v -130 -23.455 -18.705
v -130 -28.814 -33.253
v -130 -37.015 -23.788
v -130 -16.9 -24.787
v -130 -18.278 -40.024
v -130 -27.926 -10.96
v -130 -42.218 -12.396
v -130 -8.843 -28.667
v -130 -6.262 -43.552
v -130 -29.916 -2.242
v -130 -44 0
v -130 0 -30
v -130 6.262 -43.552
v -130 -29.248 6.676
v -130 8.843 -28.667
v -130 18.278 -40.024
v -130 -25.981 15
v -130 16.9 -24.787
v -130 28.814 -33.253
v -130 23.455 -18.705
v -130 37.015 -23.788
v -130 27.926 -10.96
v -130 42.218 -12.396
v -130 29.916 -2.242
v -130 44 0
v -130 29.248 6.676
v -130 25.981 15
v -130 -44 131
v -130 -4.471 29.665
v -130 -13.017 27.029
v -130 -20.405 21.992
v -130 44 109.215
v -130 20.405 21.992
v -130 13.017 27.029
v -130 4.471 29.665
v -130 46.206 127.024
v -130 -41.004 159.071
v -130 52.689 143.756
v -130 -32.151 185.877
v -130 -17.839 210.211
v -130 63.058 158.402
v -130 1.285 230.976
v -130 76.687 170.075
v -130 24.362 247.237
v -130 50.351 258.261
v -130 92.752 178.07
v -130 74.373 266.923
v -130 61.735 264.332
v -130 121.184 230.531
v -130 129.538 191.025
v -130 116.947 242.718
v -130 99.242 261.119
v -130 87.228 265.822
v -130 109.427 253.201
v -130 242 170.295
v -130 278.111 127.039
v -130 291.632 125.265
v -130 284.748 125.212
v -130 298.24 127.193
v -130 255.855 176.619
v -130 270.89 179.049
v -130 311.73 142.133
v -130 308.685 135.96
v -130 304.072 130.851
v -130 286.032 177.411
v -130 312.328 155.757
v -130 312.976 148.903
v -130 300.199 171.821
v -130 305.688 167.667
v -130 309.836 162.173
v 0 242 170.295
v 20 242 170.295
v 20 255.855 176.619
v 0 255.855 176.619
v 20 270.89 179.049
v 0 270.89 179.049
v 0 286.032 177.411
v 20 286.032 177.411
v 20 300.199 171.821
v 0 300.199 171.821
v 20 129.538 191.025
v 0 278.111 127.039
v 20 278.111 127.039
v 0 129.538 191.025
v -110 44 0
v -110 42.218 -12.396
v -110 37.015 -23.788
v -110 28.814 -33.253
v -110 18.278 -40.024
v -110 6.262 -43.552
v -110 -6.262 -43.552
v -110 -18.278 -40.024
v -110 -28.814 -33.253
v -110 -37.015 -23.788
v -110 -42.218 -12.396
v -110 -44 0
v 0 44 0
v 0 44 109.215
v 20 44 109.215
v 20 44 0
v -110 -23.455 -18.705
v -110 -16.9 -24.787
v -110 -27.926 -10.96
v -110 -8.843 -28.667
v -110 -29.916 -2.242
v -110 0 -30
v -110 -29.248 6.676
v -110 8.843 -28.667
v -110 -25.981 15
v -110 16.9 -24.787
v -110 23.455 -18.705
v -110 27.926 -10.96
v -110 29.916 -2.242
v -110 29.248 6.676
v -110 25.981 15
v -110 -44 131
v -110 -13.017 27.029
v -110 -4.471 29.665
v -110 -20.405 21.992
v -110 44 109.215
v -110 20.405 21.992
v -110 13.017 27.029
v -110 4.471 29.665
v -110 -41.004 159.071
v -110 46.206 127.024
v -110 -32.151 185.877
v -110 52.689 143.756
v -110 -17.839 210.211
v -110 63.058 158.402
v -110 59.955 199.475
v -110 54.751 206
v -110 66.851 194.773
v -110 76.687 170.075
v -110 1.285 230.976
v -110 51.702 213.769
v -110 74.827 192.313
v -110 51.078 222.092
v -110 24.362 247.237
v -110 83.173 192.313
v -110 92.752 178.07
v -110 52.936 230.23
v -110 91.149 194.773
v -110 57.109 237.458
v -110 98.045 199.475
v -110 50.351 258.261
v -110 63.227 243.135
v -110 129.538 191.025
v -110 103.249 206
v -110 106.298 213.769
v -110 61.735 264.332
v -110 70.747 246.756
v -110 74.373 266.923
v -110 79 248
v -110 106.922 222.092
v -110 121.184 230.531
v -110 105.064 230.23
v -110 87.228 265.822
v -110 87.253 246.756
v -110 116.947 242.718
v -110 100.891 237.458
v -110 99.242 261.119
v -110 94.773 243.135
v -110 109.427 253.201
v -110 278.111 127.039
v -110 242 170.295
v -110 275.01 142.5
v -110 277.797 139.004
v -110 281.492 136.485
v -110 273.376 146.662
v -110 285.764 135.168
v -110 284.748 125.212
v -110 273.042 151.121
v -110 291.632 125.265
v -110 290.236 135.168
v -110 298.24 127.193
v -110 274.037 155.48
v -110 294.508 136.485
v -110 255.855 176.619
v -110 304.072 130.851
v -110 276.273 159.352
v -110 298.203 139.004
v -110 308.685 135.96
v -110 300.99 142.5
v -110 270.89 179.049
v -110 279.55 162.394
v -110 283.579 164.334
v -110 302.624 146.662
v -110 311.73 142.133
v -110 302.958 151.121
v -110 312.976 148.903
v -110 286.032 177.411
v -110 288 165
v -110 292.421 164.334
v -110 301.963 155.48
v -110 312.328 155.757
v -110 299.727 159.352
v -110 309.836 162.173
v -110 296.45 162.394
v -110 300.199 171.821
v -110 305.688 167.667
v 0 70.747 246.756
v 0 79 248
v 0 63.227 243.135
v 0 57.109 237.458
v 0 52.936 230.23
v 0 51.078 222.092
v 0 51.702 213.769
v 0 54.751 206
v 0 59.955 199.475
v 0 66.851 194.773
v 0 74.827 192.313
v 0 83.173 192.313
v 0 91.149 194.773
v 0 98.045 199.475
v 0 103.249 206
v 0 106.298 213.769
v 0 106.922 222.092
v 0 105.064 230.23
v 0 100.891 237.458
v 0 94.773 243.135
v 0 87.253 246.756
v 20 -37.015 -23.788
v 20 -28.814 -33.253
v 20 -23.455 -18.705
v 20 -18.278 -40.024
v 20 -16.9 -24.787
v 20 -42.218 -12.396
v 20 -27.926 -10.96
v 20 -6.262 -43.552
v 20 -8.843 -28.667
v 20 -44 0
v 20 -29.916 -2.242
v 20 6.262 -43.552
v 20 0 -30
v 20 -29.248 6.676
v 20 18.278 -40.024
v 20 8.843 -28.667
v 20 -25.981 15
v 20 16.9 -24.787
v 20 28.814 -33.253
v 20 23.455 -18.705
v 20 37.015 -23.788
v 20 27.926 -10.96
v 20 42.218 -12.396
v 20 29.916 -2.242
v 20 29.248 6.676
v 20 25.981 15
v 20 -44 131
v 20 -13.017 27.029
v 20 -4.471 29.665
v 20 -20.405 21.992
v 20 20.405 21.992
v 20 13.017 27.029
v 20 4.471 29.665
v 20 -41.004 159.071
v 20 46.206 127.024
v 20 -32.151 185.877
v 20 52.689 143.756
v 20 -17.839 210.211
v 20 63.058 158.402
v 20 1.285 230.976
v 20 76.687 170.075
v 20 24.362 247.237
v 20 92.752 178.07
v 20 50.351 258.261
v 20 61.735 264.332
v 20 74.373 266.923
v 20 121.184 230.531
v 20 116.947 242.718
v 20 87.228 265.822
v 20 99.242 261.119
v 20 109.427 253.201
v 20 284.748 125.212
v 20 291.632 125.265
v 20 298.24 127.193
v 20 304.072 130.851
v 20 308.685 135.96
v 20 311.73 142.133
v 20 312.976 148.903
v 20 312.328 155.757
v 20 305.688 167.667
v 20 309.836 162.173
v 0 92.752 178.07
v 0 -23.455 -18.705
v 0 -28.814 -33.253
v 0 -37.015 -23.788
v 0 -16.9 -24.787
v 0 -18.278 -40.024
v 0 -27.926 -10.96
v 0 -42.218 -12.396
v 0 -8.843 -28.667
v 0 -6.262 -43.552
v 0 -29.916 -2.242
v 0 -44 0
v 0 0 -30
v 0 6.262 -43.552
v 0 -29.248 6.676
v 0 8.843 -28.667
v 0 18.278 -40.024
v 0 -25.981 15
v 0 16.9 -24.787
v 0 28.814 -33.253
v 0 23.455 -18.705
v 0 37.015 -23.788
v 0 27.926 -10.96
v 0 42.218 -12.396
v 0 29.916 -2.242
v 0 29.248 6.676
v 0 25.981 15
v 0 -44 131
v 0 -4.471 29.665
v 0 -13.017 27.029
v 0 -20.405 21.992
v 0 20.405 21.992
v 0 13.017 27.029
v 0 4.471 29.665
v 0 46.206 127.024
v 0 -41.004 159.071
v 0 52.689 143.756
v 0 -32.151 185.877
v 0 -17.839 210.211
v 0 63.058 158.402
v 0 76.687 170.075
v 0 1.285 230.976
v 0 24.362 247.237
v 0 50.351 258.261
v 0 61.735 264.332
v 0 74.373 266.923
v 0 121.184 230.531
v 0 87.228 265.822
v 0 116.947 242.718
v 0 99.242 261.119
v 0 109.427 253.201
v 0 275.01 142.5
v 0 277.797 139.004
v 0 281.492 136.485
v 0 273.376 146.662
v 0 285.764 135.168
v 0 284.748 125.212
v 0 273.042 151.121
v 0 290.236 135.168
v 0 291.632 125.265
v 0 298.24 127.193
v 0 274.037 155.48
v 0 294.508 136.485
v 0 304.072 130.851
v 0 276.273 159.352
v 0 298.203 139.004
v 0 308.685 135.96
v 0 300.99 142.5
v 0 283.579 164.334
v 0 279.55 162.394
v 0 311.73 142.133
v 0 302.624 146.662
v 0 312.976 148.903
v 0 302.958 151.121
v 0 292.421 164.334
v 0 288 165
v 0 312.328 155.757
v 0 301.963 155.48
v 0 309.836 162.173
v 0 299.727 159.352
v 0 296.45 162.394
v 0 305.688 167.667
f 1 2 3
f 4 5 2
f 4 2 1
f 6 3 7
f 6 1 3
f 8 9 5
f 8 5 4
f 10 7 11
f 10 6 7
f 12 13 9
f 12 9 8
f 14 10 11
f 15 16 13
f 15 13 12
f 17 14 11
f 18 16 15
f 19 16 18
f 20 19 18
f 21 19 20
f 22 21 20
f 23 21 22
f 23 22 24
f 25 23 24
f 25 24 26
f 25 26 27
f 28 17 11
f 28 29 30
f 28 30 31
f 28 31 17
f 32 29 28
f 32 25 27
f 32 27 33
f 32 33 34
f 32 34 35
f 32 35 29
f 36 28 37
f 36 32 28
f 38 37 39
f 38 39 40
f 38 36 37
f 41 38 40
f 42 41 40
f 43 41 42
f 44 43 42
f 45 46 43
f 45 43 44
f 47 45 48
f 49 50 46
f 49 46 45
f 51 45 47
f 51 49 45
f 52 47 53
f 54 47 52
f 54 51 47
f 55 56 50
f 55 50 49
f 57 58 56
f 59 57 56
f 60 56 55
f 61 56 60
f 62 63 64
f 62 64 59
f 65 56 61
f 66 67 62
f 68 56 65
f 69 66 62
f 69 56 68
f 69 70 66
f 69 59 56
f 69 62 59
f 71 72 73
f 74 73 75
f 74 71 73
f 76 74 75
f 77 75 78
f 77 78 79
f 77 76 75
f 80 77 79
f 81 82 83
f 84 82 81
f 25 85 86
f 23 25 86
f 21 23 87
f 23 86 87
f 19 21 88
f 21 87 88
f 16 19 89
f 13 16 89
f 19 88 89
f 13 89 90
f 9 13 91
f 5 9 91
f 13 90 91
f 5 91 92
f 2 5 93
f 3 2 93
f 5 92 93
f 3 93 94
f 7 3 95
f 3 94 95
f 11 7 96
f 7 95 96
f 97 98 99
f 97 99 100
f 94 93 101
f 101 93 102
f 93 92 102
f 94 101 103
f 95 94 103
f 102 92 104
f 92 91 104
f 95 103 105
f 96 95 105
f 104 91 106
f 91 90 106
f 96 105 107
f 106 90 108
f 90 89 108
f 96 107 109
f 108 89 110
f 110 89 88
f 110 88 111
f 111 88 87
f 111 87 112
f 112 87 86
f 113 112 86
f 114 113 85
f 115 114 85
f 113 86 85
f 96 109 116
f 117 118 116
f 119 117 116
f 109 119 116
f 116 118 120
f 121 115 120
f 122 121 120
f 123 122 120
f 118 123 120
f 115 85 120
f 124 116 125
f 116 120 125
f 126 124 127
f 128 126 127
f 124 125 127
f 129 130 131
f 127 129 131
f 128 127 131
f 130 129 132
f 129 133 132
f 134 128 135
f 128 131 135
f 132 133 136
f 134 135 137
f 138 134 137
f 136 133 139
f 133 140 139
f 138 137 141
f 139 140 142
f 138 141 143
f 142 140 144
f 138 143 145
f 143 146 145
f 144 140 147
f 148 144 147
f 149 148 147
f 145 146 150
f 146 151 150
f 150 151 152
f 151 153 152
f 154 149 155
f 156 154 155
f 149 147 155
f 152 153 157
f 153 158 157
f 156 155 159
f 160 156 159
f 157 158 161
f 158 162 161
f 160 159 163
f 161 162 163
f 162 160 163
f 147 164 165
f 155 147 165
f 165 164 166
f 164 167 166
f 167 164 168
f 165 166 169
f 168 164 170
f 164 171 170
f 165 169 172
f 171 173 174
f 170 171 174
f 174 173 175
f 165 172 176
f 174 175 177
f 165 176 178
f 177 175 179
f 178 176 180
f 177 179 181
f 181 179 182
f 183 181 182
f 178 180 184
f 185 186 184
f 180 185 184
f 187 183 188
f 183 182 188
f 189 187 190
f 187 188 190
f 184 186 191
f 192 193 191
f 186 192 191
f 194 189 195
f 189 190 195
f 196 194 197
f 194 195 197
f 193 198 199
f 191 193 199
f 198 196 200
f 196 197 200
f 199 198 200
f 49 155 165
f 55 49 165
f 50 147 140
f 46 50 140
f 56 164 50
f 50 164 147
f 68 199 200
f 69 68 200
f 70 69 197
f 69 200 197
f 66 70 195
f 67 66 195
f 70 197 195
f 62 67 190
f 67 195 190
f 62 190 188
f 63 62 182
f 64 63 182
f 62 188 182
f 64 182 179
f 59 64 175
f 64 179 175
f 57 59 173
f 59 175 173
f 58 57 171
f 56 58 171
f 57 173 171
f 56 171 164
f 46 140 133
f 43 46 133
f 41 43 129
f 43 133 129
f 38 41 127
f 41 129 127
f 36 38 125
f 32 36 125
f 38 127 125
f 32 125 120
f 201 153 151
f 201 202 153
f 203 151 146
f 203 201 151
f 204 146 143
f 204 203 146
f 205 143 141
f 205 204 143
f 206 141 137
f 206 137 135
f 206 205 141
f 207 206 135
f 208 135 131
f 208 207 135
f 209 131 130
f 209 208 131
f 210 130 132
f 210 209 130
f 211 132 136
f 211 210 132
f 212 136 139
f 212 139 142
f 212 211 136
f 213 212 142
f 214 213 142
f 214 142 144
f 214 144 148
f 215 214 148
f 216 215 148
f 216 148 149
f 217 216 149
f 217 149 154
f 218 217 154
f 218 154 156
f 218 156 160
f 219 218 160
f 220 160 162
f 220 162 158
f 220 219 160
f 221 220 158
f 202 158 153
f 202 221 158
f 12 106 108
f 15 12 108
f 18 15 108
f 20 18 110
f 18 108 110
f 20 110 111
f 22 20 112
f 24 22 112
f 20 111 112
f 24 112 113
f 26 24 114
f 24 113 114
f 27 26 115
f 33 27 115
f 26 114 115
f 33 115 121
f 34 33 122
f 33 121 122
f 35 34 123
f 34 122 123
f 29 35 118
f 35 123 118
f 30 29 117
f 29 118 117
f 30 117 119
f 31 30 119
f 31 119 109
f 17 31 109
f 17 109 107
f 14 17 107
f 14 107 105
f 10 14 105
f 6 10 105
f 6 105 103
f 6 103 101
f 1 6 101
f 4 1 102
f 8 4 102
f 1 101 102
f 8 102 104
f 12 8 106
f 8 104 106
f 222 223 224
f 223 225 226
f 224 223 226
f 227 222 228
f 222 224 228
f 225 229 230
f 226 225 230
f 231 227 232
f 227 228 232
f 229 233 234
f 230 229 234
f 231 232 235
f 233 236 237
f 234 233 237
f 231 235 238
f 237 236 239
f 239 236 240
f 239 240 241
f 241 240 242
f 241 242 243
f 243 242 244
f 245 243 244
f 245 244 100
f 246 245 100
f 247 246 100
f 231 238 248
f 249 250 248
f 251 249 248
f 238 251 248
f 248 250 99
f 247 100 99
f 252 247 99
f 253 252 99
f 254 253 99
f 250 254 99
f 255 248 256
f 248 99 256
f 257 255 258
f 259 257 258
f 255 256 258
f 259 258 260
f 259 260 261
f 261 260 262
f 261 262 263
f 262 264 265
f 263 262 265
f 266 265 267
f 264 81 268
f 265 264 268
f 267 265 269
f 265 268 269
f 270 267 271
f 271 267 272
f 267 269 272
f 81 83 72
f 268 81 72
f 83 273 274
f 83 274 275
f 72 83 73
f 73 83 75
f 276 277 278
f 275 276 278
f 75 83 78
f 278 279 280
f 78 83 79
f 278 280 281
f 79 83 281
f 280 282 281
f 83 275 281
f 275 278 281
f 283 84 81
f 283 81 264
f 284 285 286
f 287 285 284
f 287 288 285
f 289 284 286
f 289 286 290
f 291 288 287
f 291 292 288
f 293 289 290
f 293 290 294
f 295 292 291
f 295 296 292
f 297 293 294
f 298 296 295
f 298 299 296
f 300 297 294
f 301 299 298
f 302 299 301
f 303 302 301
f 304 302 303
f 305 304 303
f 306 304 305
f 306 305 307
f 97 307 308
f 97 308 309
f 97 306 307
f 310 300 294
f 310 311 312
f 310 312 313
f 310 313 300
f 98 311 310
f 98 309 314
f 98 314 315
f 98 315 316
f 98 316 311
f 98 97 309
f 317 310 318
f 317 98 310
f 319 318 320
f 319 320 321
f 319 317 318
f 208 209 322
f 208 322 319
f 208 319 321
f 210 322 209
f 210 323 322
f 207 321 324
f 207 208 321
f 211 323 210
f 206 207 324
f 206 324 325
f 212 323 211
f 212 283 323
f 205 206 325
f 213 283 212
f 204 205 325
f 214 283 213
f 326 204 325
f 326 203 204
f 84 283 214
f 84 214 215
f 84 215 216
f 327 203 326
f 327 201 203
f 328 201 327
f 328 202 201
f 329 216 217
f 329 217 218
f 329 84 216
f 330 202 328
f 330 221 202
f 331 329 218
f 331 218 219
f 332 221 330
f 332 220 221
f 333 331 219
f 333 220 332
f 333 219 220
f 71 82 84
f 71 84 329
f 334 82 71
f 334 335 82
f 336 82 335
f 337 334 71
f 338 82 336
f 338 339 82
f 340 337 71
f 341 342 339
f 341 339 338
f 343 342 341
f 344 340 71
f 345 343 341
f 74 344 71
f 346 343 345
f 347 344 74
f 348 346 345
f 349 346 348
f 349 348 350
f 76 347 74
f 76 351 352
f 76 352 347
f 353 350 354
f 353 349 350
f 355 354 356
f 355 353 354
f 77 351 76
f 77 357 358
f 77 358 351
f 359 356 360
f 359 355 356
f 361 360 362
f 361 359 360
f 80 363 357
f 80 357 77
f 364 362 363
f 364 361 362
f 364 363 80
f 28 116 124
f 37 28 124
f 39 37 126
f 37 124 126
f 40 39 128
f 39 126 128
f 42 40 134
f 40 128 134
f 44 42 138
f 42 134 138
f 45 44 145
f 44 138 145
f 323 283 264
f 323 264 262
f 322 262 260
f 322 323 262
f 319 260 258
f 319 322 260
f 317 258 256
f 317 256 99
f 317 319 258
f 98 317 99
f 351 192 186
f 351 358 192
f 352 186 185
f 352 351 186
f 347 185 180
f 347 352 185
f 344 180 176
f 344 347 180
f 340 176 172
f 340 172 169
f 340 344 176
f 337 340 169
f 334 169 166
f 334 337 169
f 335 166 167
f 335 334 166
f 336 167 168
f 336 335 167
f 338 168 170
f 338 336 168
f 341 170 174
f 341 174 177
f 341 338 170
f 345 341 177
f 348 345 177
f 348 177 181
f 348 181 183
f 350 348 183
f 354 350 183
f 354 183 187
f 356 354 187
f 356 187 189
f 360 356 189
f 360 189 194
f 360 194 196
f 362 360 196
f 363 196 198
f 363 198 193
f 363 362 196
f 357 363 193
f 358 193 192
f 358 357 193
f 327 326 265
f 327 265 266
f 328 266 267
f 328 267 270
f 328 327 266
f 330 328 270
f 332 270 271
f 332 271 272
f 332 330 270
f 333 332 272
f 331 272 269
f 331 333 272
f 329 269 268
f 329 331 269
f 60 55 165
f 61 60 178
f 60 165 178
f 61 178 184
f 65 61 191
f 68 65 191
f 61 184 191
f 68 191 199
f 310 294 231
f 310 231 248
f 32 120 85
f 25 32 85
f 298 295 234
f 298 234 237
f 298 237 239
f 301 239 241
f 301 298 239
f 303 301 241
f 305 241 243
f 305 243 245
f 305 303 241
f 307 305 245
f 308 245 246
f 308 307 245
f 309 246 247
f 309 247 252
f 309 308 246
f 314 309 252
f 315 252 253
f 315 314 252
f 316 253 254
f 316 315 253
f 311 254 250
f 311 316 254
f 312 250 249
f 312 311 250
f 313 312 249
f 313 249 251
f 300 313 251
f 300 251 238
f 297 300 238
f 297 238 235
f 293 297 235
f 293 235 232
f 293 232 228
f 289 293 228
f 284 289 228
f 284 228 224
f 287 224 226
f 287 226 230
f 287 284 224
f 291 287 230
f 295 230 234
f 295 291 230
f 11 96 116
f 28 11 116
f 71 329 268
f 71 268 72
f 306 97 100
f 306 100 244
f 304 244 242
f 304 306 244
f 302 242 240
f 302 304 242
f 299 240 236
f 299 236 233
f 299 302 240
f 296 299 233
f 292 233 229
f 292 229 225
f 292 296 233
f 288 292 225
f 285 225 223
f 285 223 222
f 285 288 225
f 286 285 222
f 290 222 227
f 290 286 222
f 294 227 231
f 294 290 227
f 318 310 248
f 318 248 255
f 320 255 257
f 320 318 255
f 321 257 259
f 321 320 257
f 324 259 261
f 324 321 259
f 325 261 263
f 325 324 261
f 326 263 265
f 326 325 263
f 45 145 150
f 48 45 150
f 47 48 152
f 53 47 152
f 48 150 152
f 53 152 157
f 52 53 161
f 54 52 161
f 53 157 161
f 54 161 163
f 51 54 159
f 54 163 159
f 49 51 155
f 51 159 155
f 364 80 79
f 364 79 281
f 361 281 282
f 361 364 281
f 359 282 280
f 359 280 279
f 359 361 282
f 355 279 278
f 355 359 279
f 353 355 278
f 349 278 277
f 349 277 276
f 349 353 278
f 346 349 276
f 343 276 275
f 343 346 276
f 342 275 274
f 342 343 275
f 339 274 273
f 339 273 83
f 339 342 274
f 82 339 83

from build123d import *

# Parameters (mm, degrees)
SKETCH1_R           = 30
BOSS_EXTRUDE1_DEPTH = 20
SKETCH2_R           = 15
BOSS_EXTRUDE2_DEPTH = 55
SKETCH3_R           = 28
BOSS_EXTRUDE3_DEPTH = 55


with BuildPart() as part:
    # Sketch1 → Boss-Extrude1 (new body)
    with BuildSketch(Plane(origin=(0, 0, 0), x_dir=(0, 0, -1), z_dir=(1, 0, 0))):
        with BuildLine():
            Line((0, -44), (-131, -44))
            ThreePointArc((-131, -44), (-210.210724185, -17.839417698), (-258.260566126, 50.350959788))
            ThreePointArc((-258.260566126, 50.350959788), (-263.903546034, 93.404049189), (-230.531495232, 121.183861184))
            Line((-230.531495232, 121.183861184), (-170.294790462, 242))
            ThreePointArc((-170.294790462, 242), (-179.048984689, 270.890098256), (-171.821418425, 300.199413834))
            ThreePointArc((-171.821418425, 300.199413834), (-138.941281444, 310.421078117), (-127.038840466, 278.111362436))
            Line((-127.038840466, 278.111362436), (-191.024673217, 129.537921032))
            Line((-191.024673217, 129.537921032), (-178.070389074, 92.752237372))
            ThreePointArc((-178.070389074, 92.752237372), (-151.398741624, 57.421955924), (-109.215135044, 44))
            Line((-109.215135044, 44), (0, 44))
            ThreePointArc((0, 44), (44, 0), (0, -44))
        make_face()
        Circle(SKETCH1_R, mode=Mode.SUBTRACT)
    extrude(amount=BOSS_EXTRUDE1_DEPTH)


with BuildPart() as body_2:
    # Mirror2: mirrored copy
    add(part.part.mirror(Plane(origin=(-55, 0, 0), x_dir=(0, 0, 1), z_dir=(1, 0, 0))))


with BuildPart() as part_1:
    add(part.part)

    add(body_2.part)  # Boss-Extrude2 merges body 2
    # Sketch2 → Boss-Extrude2 (add, symmetric)
    with BuildSketch(Plane(origin=(-55, 0, 0), x_dir=(0, 0, -1), z_dir=(1, 0, 0))):
        with Locations(Location((-150, 288, 0), (0, 0, 180))):
            Circle(SKETCH2_R)
    extrude(amount=BOSS_EXTRUDE2_DEPTH, both=True)

    # Sketch3 → Boss-Extrude3 (add, symmetric)
    with BuildSketch(Plane(origin=(-55, 0, 0), x_dir=(0, 0, -1), z_dir=(1, 0, 0))):
        with Locations(Location((-220, 79, 0), (0, 0, 180))):
            Circle(SKETCH3_R)
    extrude(amount=BOSS_EXTRUDE3_DEPTH, both=True)


solid = part_1.part
